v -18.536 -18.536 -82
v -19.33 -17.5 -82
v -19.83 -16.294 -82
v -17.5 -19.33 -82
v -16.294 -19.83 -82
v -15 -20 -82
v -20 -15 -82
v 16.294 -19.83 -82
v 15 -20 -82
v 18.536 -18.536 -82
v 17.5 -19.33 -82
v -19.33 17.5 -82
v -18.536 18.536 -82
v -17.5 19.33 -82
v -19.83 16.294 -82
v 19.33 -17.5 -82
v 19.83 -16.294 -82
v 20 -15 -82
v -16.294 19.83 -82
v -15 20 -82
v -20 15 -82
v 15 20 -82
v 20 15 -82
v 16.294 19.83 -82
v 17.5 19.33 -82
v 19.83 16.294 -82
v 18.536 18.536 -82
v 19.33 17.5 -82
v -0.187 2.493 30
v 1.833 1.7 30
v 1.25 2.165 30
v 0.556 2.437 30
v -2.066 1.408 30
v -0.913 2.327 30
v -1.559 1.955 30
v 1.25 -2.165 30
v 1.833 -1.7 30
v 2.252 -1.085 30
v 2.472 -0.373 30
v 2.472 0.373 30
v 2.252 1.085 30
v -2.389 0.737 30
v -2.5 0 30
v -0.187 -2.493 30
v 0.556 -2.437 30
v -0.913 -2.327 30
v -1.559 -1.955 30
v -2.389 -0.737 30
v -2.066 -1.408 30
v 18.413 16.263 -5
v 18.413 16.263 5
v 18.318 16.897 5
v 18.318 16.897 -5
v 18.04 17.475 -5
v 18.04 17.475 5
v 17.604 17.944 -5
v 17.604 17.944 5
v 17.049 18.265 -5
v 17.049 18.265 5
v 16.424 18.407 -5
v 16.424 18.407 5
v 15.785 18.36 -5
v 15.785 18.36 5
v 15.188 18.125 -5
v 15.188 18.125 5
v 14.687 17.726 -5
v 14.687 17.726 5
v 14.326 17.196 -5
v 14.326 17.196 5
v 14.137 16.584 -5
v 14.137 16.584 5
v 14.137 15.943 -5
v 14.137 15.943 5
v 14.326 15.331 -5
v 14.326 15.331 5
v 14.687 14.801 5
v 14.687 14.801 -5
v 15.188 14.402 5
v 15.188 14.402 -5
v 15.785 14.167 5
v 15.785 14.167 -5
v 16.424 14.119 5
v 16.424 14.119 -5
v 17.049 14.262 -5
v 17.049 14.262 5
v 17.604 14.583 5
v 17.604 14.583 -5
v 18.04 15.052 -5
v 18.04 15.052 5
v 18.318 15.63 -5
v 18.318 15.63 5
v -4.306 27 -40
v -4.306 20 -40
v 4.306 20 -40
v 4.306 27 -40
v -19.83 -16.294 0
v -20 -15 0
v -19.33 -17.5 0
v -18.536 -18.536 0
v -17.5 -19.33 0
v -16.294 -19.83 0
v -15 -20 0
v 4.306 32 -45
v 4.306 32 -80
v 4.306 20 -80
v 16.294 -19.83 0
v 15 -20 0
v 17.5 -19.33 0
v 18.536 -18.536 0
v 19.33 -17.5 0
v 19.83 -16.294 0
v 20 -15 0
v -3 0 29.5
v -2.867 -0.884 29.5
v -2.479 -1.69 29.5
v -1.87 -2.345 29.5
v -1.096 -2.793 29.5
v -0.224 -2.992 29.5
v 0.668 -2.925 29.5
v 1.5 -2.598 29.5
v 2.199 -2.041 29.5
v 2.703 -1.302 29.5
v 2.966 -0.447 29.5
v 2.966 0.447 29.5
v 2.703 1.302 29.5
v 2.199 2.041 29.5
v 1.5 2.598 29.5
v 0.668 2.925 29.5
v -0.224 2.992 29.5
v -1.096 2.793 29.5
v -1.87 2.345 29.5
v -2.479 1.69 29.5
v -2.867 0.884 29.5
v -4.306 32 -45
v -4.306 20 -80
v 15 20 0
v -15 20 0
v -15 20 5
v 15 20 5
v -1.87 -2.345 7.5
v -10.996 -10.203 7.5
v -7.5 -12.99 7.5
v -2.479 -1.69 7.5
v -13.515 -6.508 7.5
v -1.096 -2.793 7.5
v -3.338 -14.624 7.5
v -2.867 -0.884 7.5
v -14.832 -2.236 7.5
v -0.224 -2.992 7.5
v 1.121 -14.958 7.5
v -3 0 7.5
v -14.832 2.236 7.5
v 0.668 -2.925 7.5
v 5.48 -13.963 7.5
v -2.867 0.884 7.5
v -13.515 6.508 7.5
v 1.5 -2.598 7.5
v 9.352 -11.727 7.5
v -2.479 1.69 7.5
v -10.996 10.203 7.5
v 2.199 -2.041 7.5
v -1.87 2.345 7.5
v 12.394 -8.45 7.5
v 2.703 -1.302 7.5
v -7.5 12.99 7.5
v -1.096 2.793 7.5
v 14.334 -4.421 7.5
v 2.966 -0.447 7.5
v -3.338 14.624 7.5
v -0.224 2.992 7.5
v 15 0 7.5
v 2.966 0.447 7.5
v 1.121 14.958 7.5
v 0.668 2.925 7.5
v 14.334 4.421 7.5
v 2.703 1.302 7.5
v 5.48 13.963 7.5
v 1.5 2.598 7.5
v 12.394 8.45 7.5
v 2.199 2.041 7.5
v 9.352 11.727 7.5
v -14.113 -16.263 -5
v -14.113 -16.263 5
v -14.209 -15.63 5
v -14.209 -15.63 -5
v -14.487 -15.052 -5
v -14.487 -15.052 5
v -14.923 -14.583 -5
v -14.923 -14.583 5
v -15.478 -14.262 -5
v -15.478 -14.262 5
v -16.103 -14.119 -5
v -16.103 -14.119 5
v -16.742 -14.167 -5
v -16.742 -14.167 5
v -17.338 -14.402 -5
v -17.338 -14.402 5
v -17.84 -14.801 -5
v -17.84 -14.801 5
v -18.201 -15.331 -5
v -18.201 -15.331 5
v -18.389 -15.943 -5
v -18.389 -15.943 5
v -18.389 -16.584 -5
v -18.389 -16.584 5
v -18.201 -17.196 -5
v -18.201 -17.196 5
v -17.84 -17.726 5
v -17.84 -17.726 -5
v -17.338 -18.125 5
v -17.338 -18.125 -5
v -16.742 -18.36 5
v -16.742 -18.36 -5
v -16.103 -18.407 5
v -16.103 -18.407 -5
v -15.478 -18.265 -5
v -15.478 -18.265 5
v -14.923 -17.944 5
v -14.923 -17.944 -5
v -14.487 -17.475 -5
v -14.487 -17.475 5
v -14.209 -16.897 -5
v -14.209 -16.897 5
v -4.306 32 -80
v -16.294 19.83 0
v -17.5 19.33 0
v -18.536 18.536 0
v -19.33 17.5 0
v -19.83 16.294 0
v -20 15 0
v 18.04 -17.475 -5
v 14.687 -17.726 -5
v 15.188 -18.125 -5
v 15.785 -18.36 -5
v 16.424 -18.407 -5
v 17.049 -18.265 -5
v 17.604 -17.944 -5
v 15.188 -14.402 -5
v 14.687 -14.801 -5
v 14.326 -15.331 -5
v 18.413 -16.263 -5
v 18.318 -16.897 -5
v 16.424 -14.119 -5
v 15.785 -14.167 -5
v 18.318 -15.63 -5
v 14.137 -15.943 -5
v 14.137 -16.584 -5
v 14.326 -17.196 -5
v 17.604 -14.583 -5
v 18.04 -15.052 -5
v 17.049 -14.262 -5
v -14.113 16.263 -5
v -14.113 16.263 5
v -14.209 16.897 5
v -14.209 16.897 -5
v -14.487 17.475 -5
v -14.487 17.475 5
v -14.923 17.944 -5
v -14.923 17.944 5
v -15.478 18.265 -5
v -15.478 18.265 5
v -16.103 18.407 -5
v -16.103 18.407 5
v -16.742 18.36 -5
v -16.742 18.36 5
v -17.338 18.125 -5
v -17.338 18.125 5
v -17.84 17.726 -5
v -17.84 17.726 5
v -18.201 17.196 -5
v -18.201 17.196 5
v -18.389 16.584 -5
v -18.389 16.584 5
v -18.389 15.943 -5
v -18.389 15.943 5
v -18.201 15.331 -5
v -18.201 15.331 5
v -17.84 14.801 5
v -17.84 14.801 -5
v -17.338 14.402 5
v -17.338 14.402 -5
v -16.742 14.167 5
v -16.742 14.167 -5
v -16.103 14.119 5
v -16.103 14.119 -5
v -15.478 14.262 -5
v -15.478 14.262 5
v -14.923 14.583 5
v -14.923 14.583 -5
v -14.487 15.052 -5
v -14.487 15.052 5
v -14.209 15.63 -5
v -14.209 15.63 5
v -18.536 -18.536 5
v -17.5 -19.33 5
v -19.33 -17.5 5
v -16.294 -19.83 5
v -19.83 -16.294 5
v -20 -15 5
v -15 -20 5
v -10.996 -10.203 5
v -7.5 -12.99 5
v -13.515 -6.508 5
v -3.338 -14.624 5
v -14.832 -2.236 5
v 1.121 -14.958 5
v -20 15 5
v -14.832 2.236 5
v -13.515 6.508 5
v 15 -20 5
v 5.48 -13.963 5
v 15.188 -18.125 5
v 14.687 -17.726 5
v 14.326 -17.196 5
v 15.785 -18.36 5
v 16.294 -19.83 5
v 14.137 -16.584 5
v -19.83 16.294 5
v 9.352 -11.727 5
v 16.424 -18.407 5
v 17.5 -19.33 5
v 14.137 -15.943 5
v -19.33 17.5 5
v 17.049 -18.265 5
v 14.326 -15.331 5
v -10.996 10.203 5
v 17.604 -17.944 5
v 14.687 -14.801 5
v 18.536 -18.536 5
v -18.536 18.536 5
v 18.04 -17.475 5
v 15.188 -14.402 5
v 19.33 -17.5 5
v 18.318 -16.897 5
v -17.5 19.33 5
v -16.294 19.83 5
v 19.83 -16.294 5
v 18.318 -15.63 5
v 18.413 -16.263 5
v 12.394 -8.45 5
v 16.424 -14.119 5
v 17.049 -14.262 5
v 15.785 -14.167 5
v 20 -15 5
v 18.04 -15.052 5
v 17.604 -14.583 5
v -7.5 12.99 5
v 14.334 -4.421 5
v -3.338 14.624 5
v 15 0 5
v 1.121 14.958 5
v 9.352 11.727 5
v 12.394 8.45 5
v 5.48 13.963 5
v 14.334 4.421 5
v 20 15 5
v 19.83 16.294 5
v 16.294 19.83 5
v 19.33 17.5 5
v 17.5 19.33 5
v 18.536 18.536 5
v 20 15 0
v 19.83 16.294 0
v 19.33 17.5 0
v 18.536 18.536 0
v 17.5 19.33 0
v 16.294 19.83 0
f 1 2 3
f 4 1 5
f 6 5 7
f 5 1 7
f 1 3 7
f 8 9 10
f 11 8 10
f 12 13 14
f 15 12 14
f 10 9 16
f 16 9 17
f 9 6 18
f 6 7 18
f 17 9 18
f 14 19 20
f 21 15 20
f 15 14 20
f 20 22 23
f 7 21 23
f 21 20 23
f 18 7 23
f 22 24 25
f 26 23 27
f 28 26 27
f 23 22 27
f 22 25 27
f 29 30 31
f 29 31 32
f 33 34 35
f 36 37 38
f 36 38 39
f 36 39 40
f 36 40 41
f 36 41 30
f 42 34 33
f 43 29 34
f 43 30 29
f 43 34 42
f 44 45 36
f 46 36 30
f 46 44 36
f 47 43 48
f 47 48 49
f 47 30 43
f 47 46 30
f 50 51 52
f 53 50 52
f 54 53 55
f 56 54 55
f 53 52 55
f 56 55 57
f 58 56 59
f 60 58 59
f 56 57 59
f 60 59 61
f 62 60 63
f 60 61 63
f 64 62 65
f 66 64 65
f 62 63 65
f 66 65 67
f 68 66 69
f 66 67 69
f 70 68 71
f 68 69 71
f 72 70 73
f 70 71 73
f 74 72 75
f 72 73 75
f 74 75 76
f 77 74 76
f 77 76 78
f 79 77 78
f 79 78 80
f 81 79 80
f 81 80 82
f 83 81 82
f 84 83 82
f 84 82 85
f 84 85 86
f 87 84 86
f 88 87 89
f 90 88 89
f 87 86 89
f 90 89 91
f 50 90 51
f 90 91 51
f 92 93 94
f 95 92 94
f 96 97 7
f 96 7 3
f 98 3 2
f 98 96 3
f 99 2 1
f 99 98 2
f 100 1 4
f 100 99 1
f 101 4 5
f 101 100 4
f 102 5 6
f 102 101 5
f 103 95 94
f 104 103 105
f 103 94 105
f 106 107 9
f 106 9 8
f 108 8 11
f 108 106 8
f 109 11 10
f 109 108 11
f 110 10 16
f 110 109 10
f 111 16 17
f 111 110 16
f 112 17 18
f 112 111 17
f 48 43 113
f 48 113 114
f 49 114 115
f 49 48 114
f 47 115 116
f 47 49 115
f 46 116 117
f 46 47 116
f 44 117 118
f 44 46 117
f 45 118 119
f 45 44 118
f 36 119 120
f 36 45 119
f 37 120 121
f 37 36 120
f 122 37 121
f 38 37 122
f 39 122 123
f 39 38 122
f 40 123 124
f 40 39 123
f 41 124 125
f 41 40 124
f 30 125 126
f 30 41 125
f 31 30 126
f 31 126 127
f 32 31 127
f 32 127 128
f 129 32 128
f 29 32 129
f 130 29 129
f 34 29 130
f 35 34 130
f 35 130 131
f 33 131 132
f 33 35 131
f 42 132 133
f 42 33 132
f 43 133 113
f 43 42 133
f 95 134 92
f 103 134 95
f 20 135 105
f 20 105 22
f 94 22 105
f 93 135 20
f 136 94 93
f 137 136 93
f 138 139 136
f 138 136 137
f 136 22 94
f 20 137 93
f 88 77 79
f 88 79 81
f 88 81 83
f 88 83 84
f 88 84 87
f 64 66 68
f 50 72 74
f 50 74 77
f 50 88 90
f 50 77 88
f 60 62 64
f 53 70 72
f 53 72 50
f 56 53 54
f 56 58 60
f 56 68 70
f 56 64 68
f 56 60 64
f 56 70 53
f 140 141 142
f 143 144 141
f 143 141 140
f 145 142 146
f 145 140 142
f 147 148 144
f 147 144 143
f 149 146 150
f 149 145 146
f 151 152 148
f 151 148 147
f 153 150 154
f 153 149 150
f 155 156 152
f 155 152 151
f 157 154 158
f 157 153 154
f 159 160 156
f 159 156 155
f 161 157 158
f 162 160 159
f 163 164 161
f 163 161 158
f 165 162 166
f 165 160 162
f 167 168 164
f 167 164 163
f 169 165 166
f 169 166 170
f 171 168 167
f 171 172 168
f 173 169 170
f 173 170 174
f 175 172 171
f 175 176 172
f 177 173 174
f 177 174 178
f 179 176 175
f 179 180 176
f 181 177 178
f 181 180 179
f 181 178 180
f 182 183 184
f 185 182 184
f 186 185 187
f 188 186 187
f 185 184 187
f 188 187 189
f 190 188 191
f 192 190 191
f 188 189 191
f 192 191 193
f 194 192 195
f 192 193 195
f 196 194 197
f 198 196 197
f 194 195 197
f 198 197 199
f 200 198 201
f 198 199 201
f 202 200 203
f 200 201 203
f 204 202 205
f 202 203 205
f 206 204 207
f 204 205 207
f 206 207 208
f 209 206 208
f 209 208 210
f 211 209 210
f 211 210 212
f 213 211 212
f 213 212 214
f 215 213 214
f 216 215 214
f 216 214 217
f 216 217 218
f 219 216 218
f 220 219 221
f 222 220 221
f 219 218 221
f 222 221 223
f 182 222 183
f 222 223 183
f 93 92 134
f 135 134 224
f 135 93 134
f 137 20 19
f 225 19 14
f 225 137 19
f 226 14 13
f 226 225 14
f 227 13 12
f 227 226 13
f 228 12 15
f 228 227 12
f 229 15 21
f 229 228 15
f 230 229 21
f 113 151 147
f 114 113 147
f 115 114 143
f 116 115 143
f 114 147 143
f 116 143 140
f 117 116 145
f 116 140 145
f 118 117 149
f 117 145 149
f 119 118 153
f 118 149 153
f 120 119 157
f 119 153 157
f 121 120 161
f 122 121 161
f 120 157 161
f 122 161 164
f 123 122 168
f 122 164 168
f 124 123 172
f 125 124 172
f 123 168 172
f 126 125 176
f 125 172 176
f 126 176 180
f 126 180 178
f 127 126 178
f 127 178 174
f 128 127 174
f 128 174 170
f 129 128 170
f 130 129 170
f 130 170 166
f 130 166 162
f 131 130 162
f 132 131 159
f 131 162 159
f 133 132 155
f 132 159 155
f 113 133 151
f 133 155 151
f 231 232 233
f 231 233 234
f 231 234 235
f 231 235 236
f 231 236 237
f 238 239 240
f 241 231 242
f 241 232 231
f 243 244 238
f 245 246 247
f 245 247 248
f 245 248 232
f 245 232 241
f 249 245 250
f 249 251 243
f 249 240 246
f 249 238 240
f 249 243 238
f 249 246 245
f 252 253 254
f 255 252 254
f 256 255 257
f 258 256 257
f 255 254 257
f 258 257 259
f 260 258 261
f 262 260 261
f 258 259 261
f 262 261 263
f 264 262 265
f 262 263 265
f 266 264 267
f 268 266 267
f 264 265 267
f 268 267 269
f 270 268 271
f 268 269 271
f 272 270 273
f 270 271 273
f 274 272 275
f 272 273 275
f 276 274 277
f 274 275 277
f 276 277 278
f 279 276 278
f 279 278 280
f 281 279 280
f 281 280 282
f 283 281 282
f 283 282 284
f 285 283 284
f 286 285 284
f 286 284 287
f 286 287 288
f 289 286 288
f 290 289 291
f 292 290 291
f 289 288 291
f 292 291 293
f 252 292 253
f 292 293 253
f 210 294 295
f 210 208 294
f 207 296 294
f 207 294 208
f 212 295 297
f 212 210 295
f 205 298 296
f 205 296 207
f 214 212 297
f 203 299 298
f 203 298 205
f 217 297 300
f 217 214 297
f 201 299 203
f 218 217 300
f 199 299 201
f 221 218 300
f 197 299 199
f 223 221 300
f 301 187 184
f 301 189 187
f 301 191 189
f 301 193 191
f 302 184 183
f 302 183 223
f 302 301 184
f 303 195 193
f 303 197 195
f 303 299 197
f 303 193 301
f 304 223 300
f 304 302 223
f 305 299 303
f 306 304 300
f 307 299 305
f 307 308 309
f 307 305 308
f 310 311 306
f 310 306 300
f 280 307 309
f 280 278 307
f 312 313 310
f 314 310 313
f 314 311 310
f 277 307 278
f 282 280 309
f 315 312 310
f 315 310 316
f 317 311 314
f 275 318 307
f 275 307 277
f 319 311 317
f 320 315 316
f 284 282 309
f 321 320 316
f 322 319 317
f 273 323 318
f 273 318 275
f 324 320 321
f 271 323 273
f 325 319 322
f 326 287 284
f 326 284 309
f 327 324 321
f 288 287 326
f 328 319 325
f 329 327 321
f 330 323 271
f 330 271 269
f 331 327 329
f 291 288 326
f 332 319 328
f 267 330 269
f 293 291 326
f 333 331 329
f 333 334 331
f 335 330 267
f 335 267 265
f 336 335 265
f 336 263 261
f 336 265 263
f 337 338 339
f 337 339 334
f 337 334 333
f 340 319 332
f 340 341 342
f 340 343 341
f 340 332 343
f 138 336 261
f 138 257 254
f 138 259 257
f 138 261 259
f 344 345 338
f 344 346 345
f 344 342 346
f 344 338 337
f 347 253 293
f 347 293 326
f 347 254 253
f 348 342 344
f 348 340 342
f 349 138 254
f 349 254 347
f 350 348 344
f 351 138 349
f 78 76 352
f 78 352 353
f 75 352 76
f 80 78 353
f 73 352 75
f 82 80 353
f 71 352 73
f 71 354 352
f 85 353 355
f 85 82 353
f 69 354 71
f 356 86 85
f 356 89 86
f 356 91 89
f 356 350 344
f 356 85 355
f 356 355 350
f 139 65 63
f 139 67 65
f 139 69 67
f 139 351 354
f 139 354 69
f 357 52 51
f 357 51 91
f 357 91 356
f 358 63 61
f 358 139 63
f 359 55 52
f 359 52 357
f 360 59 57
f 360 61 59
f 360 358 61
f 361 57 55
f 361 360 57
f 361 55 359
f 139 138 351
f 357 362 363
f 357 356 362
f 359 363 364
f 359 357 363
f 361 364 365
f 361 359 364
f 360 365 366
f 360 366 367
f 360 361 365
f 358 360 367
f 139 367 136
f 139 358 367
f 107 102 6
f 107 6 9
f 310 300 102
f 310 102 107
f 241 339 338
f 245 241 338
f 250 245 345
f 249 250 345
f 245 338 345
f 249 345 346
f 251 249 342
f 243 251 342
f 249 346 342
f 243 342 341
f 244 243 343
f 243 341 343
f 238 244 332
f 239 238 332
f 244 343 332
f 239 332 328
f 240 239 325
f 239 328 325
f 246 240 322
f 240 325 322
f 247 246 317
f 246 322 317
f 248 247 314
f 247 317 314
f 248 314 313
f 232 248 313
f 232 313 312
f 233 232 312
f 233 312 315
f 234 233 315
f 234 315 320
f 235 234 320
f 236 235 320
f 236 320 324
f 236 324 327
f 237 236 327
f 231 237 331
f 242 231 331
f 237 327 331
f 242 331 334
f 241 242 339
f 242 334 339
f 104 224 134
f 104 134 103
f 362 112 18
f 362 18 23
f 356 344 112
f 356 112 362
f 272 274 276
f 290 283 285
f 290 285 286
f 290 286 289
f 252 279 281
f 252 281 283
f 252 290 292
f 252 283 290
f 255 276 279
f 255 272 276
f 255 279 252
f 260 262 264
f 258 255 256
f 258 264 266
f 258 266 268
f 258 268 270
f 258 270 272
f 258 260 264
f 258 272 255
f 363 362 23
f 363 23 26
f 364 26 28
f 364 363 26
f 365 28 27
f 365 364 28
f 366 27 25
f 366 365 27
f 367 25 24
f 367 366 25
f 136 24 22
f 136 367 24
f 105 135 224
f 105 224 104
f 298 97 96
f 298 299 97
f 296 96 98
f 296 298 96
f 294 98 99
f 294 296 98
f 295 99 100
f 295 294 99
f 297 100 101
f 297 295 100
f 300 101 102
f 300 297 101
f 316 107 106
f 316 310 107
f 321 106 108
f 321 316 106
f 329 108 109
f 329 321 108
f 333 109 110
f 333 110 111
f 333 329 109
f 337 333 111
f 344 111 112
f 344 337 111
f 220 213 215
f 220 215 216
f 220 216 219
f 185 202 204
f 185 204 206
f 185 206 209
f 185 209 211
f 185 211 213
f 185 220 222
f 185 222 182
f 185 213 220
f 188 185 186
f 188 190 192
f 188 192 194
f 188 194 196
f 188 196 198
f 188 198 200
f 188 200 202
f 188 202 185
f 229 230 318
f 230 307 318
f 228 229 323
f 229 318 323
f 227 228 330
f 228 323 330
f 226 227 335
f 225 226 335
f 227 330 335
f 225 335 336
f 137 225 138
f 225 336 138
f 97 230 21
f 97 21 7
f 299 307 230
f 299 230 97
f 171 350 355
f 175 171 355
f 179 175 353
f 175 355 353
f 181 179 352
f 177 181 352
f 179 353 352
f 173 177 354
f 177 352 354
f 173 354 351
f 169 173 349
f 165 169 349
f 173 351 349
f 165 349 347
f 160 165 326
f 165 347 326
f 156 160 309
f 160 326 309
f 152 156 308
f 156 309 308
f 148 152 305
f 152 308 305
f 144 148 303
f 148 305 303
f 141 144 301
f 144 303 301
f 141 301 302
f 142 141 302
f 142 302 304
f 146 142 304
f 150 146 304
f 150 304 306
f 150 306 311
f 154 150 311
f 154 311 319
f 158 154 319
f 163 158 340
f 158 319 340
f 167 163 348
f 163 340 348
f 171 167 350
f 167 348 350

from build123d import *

# Parameters (mm, degrees)
SKETCH1_W           = 40
SKETCH1_H           = 40
BOSS_EXTRUDE1_DEPTH = 5
FILLET1_R           = 5
SKETCH2_R           = 15
BOSS_EXTRUDE2_DEPTH = 2.5
SKETCH3_R           = 3
BOSS_EXTRUDE3_DEPTH = 22.5
BOSS_EXTRUDE5_DEPTH = 82
CHAMFER1_SIZE       = 0.5
SKETCH5_R           = 2.15
CUT_EXTRUDE1_DEPTH  = 10
SKETCH6_W           = 8.611155486
SKETCH6_H           = 40
BOSS_EXTRUDE6_DEPTH = 12
CHAMFER2_SIZE       = 5


with BuildPart() as part:
    # Sketch1 → Boss-Extrude1 (new body)
    with BuildSketch(Plane.XY):
        Rectangle(SKETCH1_W, SKETCH1_H)
    extrude(amount=BOSS_EXTRUDE1_DEPTH)

    # Fillet1
    fillet1_edges = [part.edges().sort_by_distance(p)[0] for p in [
        (20, -20, 2.5),
        (-20, -20, 2.5),
        (-20, 20, 2.5),
        (20, 20, 2.5),
    ]]
    fillet(fillet1_edges, radius=FILLET1_R)

    # Sketch2 → Boss-Extrude2 (add)
    with BuildSketch(Plane.XY.offset(5)):
        Circle(SKETCH2_R)
    extrude(amount=BOSS_EXTRUDE2_DEPTH)

    # Sketch3 → Boss-Extrude3 (add)
    with BuildSketch(Plane.XY.offset(7.5)):
        with Locations(Location((0, 0, 0), (0, 0, 180))):
            Circle(SKETCH3_R)
    extrude(amount=BOSS_EXTRUDE3_DEPTH)

    # Sketch4 → Boss-Extrude5 (add)
    with BuildSketch(Plane(origin=(0, 0, 0), x_dir=(-1, 0, 0), z_dir=(0, 0, -1))):
        with BuildLine():
            Line((-20, -15), (-20, 15))
            ThreePointArc((-20, 15), (-18.535533906, 18.535533906), (-15, 20))
            Line((-15, 20), (15, 20))
            ThreePointArc((15, 20), (18.535533906, 18.535533906), (20, 15))
            Line((20, 15), (20, -15))
            ThreePointArc((20, -15), (18.535533906, -18.535533906), (15, -20))
            Line((15, -20), (-15, -20))
            ThreePointArc((-15, -20), (-18.535533906, -18.535533906), (-20, -15))
        make_face()
    extrude(amount=BOSS_EXTRUDE5_DEPTH)

    # Chamfer1
    chamfer1_edges = [part.edges().sort_by_distance(p)[0] for p in [
        (3, 0, 30),
    ]]
    chamfer(chamfer1_edges, length=CHAMFER1_SIZE)

    # Sketch5 → Cut-Extrude1 (cut)
    with BuildSketch(Plane.XY.offset(5)):
        with Locations((-16.263455967, 16.263455967)):
            Circle(SKETCH5_R)
        with Locations((16.263455967, 16.263455967)):
            Circle(SKETCH5_R)
        with Locations((16.263455967, -16.263455967)):
            Circle(SKETCH5_R)
        with Locations((-16.263455967, -16.263455967)):
            Circle(SKETCH5_R)
    extrude(amount=-CUT_EXTRUDE1_DEPTH, mode=Mode.SUBTRACT)

    # Sketch6 → Boss-Extrude6 (add)
    with BuildSketch(Plane(origin=(0, 20, 0), x_dir=(1, 0, 0), z_dir=(0, 1, 0))):
        with Locations((0, 60)):
            Rectangle(SKETCH6_W, SKETCH6_H)
    extrude(amount=BOSS_EXTRUDE6_DEPTH)

    # Chamfer2
    chamfer2_edges = [part.edges().sort_by_distance(p)[0] for p in [
        (0, 32, -40),
    ]]
    chamfer(chamfer2_edges, length=CHAMFER2_SIZE)


solid = part.part
